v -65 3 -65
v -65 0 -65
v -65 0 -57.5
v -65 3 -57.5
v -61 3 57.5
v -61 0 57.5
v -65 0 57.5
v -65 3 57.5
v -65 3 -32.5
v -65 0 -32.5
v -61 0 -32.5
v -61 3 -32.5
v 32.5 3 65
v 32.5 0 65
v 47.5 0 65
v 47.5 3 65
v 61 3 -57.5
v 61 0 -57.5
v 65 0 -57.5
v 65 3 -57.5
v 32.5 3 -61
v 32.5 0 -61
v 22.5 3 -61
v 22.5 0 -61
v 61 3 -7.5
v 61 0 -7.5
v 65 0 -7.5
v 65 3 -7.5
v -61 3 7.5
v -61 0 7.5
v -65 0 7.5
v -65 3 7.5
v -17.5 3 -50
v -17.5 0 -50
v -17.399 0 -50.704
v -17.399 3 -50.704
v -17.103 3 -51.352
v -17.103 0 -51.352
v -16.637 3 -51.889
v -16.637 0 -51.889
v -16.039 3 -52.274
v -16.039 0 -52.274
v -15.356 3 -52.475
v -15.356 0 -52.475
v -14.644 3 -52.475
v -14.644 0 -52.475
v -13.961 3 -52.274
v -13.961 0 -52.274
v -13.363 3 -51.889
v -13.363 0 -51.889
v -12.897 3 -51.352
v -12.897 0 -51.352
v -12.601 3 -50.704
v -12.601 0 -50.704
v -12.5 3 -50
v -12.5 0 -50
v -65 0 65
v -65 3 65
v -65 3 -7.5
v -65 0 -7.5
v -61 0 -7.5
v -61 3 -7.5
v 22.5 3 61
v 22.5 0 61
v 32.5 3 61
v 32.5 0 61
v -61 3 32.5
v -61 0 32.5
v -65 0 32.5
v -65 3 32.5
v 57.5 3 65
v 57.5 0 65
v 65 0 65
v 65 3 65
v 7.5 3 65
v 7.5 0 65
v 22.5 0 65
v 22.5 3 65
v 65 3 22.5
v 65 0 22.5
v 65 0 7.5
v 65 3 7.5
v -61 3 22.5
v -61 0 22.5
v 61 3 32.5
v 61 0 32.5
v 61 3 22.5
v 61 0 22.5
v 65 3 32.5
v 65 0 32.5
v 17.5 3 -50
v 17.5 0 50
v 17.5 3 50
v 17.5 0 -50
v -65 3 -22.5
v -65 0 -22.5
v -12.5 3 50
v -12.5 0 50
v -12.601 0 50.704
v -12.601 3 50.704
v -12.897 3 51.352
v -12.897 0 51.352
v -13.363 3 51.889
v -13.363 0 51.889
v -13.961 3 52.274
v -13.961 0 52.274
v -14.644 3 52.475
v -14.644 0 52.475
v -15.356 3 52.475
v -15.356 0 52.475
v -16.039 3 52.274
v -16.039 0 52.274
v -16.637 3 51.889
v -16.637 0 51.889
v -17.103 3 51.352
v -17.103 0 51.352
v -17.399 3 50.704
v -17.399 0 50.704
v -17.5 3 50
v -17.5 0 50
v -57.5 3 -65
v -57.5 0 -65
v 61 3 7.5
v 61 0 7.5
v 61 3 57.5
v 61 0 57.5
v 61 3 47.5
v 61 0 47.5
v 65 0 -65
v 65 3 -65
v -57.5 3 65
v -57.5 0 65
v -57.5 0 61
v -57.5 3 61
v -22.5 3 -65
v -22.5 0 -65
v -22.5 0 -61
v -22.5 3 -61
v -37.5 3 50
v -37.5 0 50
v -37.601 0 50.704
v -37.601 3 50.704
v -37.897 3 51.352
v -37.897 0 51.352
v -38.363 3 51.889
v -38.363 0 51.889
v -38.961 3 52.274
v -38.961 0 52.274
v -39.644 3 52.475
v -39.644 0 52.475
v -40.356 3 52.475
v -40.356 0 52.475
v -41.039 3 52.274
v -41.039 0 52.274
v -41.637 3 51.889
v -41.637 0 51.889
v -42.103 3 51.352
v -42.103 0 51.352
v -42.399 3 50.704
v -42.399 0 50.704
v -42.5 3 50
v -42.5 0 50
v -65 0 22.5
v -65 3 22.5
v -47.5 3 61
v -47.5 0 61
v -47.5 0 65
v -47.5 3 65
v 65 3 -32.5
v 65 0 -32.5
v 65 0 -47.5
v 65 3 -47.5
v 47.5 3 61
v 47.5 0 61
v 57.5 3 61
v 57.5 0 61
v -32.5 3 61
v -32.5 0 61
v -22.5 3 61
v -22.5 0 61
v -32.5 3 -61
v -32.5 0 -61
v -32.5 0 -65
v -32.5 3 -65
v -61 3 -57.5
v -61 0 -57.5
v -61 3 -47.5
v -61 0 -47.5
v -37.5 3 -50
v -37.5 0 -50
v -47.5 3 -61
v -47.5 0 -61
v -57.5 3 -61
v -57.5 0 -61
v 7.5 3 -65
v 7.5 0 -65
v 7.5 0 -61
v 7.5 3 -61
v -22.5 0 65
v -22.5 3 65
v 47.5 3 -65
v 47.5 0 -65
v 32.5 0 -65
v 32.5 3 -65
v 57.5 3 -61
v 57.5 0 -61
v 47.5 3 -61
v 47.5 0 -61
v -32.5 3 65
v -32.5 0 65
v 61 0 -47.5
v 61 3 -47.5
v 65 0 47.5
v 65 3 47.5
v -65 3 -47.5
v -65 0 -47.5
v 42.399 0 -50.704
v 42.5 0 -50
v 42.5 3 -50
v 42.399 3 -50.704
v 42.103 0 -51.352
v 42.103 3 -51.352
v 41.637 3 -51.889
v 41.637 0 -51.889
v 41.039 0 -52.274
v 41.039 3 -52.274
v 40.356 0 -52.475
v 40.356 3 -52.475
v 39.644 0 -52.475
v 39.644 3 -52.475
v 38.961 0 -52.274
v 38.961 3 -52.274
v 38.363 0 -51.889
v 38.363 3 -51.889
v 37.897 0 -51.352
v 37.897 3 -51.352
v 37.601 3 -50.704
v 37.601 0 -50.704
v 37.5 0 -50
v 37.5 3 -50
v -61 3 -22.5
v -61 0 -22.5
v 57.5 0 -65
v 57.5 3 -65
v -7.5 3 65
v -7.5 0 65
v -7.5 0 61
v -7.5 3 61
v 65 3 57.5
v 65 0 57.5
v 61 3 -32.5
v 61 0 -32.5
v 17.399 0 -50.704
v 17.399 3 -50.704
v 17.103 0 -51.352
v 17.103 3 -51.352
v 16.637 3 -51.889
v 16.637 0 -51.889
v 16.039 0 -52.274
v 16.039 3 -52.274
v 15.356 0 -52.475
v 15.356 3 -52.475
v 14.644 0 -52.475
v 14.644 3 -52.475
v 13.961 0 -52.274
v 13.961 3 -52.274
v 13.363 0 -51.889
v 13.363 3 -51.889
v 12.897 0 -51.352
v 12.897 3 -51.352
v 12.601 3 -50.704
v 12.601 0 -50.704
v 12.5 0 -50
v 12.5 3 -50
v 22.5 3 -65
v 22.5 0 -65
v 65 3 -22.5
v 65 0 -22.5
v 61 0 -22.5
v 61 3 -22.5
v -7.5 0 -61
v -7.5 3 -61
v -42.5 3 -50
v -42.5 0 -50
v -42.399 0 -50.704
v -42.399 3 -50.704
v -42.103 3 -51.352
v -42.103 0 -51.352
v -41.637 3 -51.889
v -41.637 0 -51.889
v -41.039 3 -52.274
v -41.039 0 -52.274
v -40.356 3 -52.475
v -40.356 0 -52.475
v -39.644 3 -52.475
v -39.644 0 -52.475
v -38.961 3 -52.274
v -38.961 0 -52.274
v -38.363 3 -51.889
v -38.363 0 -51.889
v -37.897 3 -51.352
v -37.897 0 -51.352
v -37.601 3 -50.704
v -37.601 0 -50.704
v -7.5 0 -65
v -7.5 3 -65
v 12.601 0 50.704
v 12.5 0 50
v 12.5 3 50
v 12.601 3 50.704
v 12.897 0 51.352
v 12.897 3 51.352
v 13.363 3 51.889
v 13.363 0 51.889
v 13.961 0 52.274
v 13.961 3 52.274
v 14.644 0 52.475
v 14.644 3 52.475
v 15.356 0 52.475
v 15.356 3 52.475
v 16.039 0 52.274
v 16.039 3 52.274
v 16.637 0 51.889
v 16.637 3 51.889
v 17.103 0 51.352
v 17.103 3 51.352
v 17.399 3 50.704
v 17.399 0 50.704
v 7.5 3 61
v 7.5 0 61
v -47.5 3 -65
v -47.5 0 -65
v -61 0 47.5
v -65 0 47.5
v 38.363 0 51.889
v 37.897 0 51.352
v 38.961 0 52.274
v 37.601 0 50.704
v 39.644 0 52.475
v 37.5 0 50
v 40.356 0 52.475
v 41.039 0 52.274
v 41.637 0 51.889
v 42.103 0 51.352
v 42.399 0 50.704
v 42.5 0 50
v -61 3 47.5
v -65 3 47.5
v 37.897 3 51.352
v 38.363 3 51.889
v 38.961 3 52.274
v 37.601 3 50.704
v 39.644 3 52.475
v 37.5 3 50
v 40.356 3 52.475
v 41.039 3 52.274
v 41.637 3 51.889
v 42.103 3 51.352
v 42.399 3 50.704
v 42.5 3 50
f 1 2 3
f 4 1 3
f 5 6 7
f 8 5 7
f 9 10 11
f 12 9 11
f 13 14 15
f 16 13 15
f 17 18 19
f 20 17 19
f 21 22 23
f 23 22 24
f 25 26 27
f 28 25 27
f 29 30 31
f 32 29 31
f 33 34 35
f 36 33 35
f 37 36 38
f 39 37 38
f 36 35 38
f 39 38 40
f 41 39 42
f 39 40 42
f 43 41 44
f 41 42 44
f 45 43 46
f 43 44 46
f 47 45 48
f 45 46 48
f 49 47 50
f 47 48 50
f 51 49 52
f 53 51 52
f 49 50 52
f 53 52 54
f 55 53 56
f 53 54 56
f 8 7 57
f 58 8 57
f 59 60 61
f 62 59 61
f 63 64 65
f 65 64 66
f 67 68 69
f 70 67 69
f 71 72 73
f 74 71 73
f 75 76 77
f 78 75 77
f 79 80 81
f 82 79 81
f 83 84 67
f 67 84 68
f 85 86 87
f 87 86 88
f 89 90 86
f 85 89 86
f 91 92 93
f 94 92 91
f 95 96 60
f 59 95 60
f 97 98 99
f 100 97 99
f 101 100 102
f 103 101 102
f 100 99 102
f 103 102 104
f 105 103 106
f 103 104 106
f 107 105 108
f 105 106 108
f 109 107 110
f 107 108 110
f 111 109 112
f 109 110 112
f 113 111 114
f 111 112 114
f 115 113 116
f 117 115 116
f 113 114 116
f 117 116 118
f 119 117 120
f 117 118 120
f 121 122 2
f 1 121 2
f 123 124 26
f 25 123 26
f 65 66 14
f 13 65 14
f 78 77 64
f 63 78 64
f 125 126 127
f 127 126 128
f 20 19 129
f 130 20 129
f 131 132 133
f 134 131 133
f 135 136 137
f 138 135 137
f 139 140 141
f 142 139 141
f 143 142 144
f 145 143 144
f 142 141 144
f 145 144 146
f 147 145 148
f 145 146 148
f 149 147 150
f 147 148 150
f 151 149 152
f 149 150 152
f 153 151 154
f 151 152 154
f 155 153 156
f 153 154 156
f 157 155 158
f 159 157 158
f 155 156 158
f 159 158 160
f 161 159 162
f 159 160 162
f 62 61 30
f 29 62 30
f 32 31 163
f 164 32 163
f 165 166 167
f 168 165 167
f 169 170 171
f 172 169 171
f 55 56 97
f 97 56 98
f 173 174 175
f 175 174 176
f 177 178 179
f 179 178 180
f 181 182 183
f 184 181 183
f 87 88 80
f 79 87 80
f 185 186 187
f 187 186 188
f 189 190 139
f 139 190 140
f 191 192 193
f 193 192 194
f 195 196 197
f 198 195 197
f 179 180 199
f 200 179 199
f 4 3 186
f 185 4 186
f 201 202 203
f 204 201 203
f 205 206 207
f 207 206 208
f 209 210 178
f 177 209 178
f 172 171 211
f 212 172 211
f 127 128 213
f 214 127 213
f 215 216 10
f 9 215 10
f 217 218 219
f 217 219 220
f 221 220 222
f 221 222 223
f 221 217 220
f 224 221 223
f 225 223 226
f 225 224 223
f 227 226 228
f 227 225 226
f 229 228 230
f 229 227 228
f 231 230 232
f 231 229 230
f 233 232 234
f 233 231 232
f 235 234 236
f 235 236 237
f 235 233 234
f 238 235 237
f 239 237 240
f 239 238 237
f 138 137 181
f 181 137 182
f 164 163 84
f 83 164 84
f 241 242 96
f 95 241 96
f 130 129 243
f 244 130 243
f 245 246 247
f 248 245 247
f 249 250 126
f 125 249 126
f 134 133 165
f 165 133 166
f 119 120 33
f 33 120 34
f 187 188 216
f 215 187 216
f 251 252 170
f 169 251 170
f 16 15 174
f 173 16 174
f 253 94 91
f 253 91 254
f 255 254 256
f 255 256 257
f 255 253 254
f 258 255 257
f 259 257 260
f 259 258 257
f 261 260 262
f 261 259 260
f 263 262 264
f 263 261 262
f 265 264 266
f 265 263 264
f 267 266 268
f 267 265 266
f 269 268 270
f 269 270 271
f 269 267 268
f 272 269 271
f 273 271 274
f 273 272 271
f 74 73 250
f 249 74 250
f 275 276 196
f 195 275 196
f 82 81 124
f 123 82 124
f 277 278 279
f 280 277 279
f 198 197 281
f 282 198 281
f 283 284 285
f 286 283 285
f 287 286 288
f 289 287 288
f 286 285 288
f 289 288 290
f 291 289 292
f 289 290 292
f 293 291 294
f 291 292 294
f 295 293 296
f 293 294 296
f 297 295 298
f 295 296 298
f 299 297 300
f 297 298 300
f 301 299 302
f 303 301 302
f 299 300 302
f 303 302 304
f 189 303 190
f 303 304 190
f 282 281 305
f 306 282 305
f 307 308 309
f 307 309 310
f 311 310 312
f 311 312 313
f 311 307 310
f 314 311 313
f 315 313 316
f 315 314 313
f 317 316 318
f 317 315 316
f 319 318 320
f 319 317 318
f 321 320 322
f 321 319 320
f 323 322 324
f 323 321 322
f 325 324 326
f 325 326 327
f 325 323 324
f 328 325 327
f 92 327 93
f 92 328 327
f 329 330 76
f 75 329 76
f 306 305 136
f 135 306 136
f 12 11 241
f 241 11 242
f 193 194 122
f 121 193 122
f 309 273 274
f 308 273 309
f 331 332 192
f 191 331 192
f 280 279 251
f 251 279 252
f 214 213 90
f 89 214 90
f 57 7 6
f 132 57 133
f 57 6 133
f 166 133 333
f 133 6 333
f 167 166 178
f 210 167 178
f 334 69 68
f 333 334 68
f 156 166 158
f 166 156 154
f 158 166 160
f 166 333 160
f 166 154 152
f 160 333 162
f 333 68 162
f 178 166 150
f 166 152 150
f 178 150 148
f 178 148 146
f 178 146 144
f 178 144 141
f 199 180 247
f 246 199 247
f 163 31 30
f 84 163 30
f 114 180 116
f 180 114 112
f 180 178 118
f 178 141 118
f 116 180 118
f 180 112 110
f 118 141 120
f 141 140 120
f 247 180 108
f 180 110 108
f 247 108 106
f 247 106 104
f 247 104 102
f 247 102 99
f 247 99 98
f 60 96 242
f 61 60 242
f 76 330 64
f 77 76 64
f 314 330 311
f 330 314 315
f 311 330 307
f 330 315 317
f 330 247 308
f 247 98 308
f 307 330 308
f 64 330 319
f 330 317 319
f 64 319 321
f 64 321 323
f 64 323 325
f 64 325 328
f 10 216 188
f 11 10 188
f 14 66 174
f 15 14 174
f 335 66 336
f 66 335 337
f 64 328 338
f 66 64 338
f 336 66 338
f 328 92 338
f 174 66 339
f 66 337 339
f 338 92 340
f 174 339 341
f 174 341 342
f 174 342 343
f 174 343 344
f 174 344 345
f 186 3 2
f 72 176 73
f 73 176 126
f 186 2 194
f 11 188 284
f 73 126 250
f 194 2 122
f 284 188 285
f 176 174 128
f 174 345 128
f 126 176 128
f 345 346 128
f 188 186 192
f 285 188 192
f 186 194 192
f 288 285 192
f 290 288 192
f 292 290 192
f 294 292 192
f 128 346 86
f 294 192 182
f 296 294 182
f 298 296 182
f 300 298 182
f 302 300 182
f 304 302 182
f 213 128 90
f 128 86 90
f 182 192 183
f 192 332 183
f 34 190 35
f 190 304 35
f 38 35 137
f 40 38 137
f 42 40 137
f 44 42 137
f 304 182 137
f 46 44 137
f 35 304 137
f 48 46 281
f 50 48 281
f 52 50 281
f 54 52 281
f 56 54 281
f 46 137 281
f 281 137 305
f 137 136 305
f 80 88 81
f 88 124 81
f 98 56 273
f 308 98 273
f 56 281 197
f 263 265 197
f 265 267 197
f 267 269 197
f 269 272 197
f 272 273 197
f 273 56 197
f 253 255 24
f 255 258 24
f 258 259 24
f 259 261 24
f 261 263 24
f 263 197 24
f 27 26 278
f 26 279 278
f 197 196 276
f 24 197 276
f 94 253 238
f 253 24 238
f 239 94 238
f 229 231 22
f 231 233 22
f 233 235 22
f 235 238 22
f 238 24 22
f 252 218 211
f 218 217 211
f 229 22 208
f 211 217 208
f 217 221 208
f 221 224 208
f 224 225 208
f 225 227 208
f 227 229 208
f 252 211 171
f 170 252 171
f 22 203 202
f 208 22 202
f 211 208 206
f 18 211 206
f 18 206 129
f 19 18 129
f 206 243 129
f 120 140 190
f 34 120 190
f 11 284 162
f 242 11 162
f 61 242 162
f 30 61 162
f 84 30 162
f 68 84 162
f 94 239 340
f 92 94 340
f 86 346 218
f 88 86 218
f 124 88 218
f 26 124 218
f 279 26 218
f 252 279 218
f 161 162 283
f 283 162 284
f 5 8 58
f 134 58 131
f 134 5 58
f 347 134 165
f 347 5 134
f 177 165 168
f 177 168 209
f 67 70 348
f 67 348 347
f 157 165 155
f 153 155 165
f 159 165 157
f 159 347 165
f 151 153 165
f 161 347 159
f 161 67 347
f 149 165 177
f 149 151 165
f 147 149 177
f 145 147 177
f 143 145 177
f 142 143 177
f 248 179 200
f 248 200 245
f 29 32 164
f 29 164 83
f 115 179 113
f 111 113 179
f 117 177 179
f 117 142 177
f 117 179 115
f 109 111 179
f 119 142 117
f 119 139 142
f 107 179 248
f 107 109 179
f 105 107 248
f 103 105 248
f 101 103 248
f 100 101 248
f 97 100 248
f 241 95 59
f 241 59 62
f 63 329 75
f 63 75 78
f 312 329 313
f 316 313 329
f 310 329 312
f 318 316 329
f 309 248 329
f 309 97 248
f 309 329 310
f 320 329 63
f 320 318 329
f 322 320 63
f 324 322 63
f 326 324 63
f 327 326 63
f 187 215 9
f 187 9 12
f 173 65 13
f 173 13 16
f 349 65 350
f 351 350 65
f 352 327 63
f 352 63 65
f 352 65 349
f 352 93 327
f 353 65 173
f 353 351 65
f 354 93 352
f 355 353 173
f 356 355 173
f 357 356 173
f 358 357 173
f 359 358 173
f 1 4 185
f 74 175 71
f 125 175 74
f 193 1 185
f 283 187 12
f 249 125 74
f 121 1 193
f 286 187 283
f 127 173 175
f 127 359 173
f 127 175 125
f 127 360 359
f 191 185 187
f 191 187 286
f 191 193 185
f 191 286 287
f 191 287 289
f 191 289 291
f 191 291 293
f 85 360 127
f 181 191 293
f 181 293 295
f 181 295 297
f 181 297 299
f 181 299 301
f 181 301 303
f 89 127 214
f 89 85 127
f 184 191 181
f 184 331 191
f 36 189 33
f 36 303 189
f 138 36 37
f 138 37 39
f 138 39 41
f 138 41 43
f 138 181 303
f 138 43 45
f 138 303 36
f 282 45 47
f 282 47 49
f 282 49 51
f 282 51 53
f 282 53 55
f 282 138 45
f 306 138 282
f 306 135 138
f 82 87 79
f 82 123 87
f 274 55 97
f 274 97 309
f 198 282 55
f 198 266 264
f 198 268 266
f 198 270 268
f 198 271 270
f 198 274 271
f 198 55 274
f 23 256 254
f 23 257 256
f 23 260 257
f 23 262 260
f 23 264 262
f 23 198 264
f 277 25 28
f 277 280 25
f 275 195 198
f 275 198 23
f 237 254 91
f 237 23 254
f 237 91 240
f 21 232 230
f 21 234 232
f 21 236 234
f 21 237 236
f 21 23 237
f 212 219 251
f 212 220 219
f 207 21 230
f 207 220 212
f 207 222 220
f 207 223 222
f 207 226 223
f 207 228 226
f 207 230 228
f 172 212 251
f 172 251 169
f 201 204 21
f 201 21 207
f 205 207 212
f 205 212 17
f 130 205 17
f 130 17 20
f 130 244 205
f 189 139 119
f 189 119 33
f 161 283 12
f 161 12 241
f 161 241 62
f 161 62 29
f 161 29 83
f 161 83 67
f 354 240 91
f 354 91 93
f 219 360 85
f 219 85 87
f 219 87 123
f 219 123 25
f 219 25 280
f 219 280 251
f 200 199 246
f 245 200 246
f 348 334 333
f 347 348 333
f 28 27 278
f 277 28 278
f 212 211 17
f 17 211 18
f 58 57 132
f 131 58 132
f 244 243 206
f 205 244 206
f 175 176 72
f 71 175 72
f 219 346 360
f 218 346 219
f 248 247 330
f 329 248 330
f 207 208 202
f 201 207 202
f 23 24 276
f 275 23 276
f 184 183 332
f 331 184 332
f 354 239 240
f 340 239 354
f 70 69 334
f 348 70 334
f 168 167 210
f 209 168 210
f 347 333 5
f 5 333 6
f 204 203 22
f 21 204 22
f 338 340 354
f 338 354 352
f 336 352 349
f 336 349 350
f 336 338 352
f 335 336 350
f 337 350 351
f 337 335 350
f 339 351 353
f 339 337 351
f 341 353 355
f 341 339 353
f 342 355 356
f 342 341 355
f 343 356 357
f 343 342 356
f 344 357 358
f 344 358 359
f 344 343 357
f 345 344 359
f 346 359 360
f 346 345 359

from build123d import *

# Parameters (mm, degrees)
BOSS_EXTRUDE1_DEPTH = 3


with BuildPart() as part:
    # Sketch1 → Boss-Extrude1 (new body)
    with BuildSketch(Plane(origin=(0, 0, 0), x_dir=(1, 0, 0), z_dir=(0, 1, 0))):
        Polygon((-65, -65), (-57.5, -65), (-57.5, -61), (-47.5, -61), (-47.5, -65), (-32.5, -65), (-32.5, -61), (-22.5, -61), (-22.5, -65), (-7.5, -65), (-7.5, -61), (7.5, -61), (7.5, -65), (22.5, -65), (22.5, -61), (32.5, -61), (32.5, -65), (47.5, -65), (47.5, -61), (57.5, -61), (57.5, -65), (65, -65), (65, -57.5), (61, -57.5), (61, -47.5), (65, -47.5), (65, -32.5), (61, -32.5), (61, -22.5), (65, -22.5), (65, -7.5), (61, -7.5), (61, 7.5), (65, 7.5), (65, 22.5), (61, 22.5), (61, 32.5), (65, 32.5), (65, 47.5), (61, 47.5), (61, 57.5), (65, 57.5), (65, 65), (57.5, 65), (57.5, 61), (47.5, 61), (47.5, 65), (32.5, 65), (32.5, 61), (22.5, 61), (22.5, 65), (7.5, 65), (7.5, 61), (-7.5, 61), (-7.5, 65), (-22.5, 65), (-22.5, 61), (-32.5, 61), (-32.5, 65), (-47.5, 65), (-47.5, 61), (-57.5, 61), (-57.5, 65), (-65, 65), (-65, 57.5), (-61, 57.5), (-61, 47.5), (-65, 47.5), (-65, 32.5), (-61, 32.5), (-61, 22.5), (-65, 22.5), (-65, 7.5), (-61, 7.5), (-61, -7.5), (-65, -7.5), (-65, -22.5), (-61, -22.5), (-61, -32.5), (-65, -32.5), (-65, -47.5), (-61, -47.5), (-61, -57.5), (-65, -57.5), align=None)
        with BuildLine():
            Line((-37.5, 50), (-37.5, -50))
            ThreePointArc((-37.5, -50), (-40, -52.5), (-42.5, -50))
            Line((-42.5, -50), (-42.5, 50))
            ThreePointArc((-42.5, 50), (-40, 52.5), (-37.5, 50))
        make_face(mode=Mode.SUBTRACT)
        with BuildLine():
            Line((-12.5, 50), (-12.5, -50))
            ThreePointArc((-12.5, -50), (-15, -52.5), (-17.5, -50))
            Line((-17.5, -50), (-17.5, 50))
            ThreePointArc((-17.5, 50), (-15, 52.5), (-12.5, 50))
        make_face(mode=Mode.SUBTRACT)
        with BuildLine():
            Line((37.5, 50), (37.5, -50))
            ThreePointArc((37.5, -50), (40, -52.5), (42.5, -50))
            Line((42.5, -50), (42.5, 50))
            ThreePointArc((42.5, 50), (40, 52.5), (37.5, 50))
        make_face(mode=Mode.SUBTRACT)
        with BuildLine():
            Line((12.5, 50), (12.5, -50))
            ThreePointArc((12.5, -50), (15, -52.5), (17.5, -50))
            Line((17.5, -50), (17.5, 50))
            ThreePointArc((17.5, 50), (15, 52.5), (12.5, 50))
        make_face(mode=Mode.SUBTRACT)
    extrude(amount=BOSS_EXTRUDE1_DEPTH)


solid = part.part
